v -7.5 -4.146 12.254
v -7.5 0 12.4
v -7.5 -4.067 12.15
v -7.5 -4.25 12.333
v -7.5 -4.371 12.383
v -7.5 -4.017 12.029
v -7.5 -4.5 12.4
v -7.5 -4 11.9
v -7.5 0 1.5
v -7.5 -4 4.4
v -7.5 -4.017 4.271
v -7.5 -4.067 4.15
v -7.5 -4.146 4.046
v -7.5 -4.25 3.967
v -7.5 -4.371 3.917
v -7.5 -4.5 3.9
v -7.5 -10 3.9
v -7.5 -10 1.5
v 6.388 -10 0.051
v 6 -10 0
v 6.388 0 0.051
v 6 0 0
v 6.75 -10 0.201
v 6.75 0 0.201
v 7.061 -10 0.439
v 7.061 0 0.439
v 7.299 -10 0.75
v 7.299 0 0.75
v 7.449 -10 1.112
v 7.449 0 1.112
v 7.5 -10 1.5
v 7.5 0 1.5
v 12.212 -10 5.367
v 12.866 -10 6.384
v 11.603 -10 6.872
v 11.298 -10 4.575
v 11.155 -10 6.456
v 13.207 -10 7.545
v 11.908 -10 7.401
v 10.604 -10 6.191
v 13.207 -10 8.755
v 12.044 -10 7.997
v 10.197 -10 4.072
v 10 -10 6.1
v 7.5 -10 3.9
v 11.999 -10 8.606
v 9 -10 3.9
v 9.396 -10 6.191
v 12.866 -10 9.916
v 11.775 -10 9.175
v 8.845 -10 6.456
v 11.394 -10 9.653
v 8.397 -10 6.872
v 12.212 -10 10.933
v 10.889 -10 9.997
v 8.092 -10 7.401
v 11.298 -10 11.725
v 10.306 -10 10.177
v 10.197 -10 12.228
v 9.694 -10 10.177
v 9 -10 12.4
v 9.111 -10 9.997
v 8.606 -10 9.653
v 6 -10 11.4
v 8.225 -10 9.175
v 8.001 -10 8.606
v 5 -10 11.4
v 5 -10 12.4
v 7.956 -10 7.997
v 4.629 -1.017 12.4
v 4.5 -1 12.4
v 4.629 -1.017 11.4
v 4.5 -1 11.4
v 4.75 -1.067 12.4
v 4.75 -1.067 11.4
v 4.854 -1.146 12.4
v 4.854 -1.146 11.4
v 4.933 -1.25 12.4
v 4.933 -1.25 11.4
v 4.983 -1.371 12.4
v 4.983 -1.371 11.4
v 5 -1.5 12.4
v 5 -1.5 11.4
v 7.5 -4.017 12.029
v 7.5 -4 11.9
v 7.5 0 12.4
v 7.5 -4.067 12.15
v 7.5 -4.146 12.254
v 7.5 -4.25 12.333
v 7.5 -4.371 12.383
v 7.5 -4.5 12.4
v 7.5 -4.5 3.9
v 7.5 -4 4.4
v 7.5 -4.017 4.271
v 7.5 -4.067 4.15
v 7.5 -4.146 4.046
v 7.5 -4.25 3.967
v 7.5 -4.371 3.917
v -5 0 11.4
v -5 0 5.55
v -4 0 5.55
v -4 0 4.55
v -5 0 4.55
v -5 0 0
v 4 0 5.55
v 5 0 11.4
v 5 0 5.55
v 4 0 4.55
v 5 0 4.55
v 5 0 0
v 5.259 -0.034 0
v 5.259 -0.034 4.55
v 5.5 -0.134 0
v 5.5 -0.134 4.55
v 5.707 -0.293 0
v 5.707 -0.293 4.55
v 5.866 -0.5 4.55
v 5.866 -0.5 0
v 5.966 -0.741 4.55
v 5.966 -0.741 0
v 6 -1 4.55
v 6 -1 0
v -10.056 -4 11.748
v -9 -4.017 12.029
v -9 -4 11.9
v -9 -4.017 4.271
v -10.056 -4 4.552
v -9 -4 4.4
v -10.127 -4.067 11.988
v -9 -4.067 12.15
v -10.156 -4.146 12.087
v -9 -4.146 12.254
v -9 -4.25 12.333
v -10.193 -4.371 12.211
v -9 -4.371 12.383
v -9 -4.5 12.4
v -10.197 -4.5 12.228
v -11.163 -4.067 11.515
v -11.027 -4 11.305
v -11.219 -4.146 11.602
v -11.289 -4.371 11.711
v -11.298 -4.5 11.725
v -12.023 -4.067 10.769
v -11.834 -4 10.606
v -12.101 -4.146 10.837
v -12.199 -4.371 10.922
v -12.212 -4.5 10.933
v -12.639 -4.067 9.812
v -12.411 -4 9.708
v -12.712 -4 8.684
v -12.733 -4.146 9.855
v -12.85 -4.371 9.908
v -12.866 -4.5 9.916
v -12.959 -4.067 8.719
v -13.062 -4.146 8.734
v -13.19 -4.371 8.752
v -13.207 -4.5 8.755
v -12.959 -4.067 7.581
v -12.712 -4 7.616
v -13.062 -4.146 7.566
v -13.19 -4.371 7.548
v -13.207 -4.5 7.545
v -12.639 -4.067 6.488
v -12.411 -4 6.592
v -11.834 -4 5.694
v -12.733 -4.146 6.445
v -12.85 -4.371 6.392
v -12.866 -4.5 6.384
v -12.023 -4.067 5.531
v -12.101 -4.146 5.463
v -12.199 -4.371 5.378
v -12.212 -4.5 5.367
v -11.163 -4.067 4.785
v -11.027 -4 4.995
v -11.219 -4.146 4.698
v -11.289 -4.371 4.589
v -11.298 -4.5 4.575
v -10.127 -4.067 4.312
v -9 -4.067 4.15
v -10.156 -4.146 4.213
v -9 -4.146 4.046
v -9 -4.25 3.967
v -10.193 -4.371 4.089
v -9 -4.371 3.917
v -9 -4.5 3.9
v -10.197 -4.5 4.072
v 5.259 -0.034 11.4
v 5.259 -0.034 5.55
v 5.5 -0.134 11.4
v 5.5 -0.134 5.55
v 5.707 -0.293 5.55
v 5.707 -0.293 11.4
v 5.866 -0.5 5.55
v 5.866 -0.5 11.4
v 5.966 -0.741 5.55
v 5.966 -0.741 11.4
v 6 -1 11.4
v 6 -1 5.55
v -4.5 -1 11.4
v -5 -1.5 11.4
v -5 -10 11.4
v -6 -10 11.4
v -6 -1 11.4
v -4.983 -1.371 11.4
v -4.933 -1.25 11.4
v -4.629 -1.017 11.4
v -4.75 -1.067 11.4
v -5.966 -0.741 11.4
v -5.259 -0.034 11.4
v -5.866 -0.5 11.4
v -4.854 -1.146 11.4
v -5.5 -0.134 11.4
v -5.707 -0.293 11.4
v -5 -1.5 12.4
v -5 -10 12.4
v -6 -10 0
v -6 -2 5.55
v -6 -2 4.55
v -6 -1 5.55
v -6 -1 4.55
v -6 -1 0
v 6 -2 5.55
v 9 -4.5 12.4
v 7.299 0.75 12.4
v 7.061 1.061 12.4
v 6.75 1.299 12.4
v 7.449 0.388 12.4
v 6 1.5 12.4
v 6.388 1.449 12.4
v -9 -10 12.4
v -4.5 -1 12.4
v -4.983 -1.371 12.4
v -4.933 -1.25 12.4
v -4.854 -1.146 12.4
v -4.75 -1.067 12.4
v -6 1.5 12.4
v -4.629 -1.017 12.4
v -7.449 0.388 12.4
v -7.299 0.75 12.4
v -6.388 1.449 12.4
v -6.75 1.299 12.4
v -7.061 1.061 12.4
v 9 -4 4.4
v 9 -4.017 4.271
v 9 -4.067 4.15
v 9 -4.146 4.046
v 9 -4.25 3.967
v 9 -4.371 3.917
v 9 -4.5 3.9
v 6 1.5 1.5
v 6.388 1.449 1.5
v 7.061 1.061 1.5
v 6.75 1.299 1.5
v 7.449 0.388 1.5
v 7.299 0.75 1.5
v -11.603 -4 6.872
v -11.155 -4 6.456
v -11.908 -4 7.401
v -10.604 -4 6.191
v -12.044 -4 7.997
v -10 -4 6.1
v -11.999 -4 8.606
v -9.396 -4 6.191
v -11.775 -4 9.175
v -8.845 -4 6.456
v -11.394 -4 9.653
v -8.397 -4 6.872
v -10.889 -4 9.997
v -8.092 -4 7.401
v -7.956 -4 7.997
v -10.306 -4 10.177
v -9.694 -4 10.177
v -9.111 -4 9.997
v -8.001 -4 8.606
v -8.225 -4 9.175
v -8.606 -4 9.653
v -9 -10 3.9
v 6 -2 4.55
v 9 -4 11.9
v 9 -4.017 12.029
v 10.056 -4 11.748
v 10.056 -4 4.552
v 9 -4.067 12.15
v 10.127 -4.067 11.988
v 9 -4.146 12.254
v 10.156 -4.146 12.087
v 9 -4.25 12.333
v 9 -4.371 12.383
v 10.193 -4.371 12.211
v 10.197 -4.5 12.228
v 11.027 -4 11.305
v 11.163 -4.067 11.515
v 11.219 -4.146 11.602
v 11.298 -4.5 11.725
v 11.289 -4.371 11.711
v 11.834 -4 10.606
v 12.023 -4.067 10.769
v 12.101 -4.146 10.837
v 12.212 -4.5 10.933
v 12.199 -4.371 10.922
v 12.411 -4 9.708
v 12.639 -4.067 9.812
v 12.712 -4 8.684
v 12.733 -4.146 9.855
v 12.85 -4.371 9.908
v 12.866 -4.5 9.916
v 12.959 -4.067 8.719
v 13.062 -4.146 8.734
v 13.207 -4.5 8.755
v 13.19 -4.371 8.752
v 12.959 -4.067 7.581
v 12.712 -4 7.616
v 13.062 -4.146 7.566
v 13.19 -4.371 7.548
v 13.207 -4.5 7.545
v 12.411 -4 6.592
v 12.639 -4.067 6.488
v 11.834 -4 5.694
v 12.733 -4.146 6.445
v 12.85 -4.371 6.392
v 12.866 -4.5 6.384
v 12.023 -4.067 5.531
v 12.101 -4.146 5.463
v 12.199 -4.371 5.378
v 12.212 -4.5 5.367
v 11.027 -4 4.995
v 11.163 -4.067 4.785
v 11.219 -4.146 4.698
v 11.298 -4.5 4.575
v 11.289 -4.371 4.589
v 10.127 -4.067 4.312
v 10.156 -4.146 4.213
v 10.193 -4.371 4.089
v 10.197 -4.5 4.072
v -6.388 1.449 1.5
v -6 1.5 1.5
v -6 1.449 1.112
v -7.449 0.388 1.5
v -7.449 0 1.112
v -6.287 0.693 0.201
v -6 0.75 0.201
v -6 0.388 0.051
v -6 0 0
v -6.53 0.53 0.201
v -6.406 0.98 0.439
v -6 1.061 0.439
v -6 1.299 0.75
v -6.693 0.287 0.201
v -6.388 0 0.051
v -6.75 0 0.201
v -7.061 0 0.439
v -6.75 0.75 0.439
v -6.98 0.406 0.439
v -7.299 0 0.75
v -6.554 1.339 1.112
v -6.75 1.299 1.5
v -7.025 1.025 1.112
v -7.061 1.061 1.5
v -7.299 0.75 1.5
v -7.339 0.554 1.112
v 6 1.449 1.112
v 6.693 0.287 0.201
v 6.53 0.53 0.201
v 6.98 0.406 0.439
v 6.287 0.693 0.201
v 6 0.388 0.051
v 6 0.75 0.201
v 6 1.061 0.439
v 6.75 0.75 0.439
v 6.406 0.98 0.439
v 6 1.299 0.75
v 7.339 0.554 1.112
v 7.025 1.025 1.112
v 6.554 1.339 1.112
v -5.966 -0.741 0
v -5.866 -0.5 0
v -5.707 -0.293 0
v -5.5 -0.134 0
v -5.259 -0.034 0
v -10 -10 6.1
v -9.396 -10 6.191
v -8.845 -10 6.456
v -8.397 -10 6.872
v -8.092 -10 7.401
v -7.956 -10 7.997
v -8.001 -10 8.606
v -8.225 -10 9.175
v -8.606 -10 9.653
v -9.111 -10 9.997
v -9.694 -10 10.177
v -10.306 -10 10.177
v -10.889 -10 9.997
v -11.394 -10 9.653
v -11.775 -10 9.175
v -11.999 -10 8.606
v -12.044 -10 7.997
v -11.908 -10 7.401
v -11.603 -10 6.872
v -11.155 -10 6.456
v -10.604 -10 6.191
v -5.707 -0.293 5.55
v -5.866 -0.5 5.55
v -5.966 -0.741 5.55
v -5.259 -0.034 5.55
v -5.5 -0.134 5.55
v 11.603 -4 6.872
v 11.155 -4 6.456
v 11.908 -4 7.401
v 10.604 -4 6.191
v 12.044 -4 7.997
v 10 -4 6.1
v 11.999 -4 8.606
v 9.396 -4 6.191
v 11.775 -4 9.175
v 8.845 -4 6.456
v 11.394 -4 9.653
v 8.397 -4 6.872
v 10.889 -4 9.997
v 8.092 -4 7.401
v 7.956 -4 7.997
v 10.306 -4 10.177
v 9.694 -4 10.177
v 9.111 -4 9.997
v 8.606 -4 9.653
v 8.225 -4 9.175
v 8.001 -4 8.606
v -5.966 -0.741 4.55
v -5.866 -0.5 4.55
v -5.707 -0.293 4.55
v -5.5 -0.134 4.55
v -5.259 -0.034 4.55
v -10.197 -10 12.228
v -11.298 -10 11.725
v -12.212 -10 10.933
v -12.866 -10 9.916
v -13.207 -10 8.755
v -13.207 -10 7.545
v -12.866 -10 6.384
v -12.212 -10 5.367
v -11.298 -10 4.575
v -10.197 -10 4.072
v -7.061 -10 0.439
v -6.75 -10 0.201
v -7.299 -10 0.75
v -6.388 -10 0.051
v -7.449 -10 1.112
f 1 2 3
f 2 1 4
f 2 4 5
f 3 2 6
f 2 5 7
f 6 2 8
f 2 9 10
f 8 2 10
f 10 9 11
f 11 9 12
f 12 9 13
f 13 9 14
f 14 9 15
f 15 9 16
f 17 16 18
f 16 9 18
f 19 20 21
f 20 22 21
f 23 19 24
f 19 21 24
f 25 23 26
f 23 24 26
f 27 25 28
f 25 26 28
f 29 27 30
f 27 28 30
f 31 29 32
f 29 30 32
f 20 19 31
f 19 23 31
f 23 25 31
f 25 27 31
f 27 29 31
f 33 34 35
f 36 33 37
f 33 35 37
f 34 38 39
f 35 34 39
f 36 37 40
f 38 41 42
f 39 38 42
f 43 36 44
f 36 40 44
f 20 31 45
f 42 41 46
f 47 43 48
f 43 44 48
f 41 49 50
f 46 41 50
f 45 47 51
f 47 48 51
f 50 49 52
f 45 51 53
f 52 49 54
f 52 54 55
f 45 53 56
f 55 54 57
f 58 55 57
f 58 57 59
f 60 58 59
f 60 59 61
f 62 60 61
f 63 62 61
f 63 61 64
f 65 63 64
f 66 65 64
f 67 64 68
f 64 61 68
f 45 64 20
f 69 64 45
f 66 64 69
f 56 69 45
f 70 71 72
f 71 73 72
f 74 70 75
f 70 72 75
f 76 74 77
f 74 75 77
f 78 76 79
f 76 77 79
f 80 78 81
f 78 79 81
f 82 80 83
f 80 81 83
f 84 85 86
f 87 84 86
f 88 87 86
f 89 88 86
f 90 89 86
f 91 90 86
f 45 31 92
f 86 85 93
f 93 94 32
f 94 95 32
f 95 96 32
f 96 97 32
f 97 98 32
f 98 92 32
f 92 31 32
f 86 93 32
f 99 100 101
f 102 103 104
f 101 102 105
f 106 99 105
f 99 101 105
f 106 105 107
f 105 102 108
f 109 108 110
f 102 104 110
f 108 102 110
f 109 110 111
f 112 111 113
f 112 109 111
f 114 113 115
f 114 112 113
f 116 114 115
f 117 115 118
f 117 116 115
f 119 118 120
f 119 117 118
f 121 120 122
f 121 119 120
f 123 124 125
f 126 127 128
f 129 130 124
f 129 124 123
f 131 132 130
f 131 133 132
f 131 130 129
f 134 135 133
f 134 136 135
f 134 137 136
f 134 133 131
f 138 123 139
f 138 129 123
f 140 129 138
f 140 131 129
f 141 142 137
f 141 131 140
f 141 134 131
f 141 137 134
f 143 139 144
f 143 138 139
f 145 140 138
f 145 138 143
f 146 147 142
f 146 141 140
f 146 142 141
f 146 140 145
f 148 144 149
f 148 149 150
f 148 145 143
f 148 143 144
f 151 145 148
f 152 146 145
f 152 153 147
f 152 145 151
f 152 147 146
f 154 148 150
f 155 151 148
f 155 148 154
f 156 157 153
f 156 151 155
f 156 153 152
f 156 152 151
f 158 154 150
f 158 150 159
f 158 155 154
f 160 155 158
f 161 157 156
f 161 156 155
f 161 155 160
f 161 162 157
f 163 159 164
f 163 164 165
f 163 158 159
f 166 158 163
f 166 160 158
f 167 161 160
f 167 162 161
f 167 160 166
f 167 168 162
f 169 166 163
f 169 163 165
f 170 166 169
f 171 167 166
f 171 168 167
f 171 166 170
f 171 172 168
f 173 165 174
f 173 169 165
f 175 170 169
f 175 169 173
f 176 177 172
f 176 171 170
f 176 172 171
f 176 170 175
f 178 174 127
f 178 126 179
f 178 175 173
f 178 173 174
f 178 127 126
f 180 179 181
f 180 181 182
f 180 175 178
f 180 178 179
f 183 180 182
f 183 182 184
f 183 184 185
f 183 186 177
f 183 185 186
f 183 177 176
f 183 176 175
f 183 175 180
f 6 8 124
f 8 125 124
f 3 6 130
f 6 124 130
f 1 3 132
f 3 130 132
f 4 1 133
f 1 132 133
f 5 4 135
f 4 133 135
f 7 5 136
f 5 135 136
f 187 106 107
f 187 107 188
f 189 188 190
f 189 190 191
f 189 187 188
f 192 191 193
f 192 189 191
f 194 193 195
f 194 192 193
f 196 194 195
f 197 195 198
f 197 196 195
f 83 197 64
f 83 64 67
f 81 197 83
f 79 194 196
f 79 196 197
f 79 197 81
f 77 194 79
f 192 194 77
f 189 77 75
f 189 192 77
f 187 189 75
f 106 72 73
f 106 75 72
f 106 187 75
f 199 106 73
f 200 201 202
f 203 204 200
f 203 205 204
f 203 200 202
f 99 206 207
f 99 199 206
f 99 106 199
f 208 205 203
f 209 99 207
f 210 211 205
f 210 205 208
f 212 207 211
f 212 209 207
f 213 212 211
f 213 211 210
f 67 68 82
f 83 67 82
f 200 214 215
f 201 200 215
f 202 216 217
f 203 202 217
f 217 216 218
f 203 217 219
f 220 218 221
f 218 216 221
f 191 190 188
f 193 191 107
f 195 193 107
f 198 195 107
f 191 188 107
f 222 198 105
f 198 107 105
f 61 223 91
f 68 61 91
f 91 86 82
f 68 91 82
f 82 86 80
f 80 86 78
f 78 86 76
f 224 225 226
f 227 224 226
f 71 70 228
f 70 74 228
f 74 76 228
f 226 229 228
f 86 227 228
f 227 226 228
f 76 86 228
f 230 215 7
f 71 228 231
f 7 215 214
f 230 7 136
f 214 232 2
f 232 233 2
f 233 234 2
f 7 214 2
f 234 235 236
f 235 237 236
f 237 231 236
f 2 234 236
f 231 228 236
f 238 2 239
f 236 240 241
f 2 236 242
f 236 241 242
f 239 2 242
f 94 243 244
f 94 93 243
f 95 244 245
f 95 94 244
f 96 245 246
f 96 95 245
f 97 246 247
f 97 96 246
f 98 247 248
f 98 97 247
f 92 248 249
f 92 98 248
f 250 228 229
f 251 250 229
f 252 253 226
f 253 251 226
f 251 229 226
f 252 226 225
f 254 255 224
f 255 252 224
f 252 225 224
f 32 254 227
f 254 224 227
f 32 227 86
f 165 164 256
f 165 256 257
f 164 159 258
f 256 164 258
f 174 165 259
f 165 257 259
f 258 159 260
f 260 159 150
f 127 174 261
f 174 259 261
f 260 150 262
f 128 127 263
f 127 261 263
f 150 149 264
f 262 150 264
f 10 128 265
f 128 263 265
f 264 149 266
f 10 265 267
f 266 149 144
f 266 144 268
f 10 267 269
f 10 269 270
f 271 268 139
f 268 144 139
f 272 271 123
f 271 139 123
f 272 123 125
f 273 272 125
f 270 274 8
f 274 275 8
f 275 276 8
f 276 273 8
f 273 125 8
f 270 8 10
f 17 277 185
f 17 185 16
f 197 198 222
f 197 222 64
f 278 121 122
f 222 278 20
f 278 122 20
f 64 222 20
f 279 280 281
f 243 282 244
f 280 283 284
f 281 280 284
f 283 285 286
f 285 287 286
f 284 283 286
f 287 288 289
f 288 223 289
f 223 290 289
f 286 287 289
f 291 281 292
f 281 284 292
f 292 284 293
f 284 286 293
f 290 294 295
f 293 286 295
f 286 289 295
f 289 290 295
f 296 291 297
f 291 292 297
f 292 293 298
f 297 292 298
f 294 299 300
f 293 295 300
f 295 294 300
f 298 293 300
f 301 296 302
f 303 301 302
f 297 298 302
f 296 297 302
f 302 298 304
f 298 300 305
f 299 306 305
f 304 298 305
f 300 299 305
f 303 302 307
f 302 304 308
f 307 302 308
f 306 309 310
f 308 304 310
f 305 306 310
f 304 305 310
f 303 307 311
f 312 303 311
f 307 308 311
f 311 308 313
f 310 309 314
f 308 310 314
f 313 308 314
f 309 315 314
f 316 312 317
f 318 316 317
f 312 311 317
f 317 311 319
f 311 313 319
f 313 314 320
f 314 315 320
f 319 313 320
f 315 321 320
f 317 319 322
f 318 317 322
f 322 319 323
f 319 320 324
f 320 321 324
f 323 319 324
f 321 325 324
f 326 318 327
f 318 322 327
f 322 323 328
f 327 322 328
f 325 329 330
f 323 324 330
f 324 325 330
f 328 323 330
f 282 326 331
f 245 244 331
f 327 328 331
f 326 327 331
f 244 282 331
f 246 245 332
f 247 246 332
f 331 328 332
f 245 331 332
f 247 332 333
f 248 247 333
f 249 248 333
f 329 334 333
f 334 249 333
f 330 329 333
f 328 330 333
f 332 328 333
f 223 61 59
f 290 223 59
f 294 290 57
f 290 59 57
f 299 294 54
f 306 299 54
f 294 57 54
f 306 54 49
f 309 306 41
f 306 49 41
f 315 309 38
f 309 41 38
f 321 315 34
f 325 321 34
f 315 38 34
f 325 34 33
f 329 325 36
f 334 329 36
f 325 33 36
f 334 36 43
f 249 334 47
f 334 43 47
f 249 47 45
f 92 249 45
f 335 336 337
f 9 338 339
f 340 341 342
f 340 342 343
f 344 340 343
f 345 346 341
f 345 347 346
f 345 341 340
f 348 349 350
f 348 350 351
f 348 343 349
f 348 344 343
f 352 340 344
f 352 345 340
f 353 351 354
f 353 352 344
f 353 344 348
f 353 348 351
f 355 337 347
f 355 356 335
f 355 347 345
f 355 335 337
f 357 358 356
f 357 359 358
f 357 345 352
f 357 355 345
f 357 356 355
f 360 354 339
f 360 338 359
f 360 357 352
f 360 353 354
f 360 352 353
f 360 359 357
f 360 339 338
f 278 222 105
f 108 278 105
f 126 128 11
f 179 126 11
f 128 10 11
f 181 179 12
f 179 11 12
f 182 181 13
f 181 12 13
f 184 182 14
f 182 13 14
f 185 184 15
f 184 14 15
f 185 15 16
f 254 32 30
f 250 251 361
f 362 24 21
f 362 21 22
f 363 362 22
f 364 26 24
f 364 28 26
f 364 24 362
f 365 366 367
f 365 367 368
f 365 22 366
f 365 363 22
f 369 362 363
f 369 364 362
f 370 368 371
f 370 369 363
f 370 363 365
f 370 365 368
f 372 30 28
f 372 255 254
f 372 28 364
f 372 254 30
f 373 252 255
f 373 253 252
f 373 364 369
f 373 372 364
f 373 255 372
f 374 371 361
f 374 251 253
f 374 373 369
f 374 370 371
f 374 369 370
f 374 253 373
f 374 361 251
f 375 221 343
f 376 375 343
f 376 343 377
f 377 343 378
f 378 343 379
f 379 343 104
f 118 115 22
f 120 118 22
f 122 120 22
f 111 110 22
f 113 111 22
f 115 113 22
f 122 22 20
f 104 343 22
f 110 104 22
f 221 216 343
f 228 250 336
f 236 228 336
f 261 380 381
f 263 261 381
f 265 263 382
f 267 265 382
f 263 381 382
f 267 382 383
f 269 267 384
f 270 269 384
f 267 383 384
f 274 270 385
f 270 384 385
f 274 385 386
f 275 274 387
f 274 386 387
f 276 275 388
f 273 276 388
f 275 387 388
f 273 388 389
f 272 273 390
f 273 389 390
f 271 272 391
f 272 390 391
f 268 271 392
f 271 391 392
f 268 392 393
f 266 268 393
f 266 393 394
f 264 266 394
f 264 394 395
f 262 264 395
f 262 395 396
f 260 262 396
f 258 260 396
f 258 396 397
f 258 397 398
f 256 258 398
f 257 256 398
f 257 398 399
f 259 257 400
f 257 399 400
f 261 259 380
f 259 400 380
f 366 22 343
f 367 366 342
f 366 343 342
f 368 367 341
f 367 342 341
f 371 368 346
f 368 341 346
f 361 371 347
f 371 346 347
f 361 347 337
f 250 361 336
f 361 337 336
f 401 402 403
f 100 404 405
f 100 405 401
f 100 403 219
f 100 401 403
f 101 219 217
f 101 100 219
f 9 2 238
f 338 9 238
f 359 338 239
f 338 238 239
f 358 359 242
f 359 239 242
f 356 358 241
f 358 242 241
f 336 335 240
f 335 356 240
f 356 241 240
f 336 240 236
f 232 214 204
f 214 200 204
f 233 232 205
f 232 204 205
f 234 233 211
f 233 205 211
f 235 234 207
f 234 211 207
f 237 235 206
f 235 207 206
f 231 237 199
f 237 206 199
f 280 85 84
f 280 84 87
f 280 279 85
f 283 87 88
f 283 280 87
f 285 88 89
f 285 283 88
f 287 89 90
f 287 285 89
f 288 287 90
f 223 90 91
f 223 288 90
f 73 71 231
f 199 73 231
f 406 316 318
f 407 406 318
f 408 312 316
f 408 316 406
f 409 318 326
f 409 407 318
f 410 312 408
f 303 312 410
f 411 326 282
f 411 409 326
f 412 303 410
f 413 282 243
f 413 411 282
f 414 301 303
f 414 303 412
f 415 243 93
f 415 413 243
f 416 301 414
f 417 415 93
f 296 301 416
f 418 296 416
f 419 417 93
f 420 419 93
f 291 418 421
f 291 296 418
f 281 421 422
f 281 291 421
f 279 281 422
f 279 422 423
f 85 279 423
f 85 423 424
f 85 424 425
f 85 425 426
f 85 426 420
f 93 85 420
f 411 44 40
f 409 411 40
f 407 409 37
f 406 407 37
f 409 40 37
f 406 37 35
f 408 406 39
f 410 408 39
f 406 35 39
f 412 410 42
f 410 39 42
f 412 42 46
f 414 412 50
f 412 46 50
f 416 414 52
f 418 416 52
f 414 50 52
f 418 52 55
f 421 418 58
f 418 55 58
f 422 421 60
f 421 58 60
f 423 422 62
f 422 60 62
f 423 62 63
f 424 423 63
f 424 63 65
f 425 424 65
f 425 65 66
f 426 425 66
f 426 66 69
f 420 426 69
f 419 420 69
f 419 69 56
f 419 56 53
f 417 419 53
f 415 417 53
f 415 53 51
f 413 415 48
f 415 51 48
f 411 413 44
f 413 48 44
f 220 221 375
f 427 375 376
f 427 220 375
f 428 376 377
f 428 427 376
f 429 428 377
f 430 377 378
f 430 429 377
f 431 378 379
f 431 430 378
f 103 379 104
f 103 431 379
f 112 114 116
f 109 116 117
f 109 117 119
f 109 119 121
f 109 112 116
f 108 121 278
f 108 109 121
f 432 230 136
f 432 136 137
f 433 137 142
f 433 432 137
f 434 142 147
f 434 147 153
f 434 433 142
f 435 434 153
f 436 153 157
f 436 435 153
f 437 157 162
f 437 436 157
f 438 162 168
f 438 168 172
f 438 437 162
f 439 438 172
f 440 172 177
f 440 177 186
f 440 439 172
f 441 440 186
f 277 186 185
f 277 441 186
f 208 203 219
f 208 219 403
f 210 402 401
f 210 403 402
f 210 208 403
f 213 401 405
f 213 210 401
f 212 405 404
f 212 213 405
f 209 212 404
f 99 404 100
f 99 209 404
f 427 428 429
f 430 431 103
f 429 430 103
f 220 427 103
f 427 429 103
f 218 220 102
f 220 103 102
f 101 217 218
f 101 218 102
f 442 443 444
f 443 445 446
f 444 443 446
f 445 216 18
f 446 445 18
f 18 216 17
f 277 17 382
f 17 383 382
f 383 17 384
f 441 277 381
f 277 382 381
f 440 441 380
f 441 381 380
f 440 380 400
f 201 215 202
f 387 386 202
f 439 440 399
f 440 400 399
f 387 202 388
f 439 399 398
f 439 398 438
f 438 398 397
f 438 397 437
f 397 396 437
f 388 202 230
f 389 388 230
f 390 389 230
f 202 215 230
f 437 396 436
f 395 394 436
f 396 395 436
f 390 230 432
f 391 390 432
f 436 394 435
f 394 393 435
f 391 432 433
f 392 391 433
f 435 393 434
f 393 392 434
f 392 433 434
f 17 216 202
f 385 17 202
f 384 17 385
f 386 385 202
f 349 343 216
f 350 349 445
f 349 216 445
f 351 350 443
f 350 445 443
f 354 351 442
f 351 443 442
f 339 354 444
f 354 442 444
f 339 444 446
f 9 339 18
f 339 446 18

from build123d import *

# Parameters (mm, degrees)
BOSS_EXTRUDE1_DEPTH = 12.4
BOSS_EXTRUDE2_DEPTH = 6
SKETCH4_R           = 2.05
CUT_EXTRUDE1_DEPTH  = 6
FILLET1_R           = 1.5
FILLET2_R           = 0.5
FILLET3_R           = 1
BOSS_EXTRUDE3_DEPTH = 1
FILLET4_R           = 0.5
BOSS_EXTRUDE4_DEPTH = 1
FILLET5_R           = 1.5


with BuildPart() as part:
    # Sketch1 → Boss-Extrude1 (new body)
    with BuildSketch(Plane.XY):
        Polygon((0, 0), (6, 0), (6, -10), (7.5, -10), (7.5, 1.5), (0, 1.5), (-7.5, 1.5), (-7.5, -10), (-6, -10), (-6, 0), align=None)
    extrude(amount=BOSS_EXTRUDE1_DEPTH)

    # Sketch3 → Boss-Extrude2 (add)
    with BuildSketch(Plane.XZ.offset(10)):
        with BuildLine():
            Line((7.5, 3.9), (7.5, 12.4))
            Line((7.5, 12.4), (9, 12.4))
            ThreePointArc((9, 12.4), (13.25, 8.15), (9, 3.9))
            Line((9, 3.9), (7.5, 3.9))
        make_face()
        with BuildLine():
            Line((-7.5, 12.4), (-9, 12.4))
            ThreePointArc((-9, 12.4), (-13.25, 8.15), (-9, 3.9))
            Line((-9, 3.9), (-7.5, 3.9))
            Line((-7.5, 3.9), (-7.5, 12.4))
        make_face()
    extrude(amount=-BOSS_EXTRUDE2_DEPTH)

    # Sketch4 → Cut-Extrude1 (cut)
    with BuildSketch(Plane.XZ.offset(10)):
        with Locations(Location((-10, 8.15, 0), (0, 0, 270))):
            Circle(SKETCH4_R)
        with Locations(Location((10, 8.15, 0), (0, 0, 270))):
            Circle(SKETCH4_R)
    extrude(amount=-CUT_EXTRUDE1_DEPTH, mode=Mode.SUBTRACT)

    # Fillet1
    fillet1_edges = [part.edges().sort_by_distance(p)[0] for p in [
        (-7.5, 1.5, 6.2),
        (7.5, 1.5, 6.2),
    ]]
    fillet(fillet1_edges, radius=FILLET1_R)

    # Fillet2
    fillet2_edges = [part.edges().sort_by_distance(p)[0] for p in [
        (8.25, -4, 3.9),
        (8.25, -4, 12.4),
        (13.25, -4, 8.15),
        (-13.25, -4, 8.15),
        (-8.25, -4, 12.4),
        (-8.25, -4, 3.9),
    ]]
    fillet(fillet2_edges, radius=FILLET2_R)

    # Fillet3
    fillet3_edges = [part.edges().sort_by_distance(p)[0] for p in [
        (6, 0, 6.2),
        (-6, 0, 6.2),
    ]]
    fillet(fillet3_edges, radius=FILLET3_R)

    # Sketch6 → Boss-Extrude3 (add)
    with BuildSketch(Plane(origin=(0, 0, 12.4), x_dir=(-1, 0, 0), z_dir=(0, 0, -1))):
        with BuildLine():
            Line((6, -10), (6, -1))
            ThreePointArc((6, -1), (5.707106781, -0.292893219), (5, 0))
            Line((5, 0), (-5, 0))
            ThreePointArc((-5, 0), (-5.707106781, -0.292893219), (-6, -1))
            Line((-6, -1), (-6, -10))
            Line((-6, -10), (-5, -10))
            Line((-5, -10), (-5, -1))
            Line((-5, -1), (5, -1))
            Line((5, -1), (5, -10))
            Line((5, -10), (6, -10))
        make_face()
    extrude(amount=BOSS_EXTRUDE3_DEPTH)

    # Fillet4
    fillet4_edges = [part.edges().sort_by_distance(p)[0] for p in [
        (5, -1, 11.9),
        (-5, -1, 11.9),
    ]]
    fillet(fillet4_edges, radius=FILLET4_R)

    # Sketch7 → Boss-Extrude4 (add)
    with BuildSketch(Plane(origin=(0, 0, 5.55), x_dir=(-1, 0, 0), z_dir=(0, 0, -1))):
        with BuildLine():
            Line((-4, 0), (-5, 0))
            ThreePointArc((-5, 0), (-5.707106781, -0.292893219), (-6, -1))
            Line((-6, -1), (-6, -2))
            Line((-6, -2), (-4, 0))
        make_face()
        with BuildLine():
            ThreePointArc((5, 0), (5.707106781, -0.292893219), (6, -1))
            Line((6, -1), (6, -2))
            Line((6, -2), (4, 0))
            Line((4, 0), (5, 0))
        make_face()
    extrude(amount=BOSS_EXTRUDE4_DEPTH)

    # Fillet5
    fillet5_edges = [part.edges().sort_by_distance(p)[0] for p in [
        (-7.5, -5, 0),
        (-7.060660172, 1.060660172, 0),
        (0, 1.5, 0),
        (7.060660172, 1.060660172, 0),
        (7.5, -5, 0),
    ]]
    fillet(fillet5_edges, radius=FILLET5_R - 0.0001)  # a hair under: the kernel refuses the full size


solid = part.part
